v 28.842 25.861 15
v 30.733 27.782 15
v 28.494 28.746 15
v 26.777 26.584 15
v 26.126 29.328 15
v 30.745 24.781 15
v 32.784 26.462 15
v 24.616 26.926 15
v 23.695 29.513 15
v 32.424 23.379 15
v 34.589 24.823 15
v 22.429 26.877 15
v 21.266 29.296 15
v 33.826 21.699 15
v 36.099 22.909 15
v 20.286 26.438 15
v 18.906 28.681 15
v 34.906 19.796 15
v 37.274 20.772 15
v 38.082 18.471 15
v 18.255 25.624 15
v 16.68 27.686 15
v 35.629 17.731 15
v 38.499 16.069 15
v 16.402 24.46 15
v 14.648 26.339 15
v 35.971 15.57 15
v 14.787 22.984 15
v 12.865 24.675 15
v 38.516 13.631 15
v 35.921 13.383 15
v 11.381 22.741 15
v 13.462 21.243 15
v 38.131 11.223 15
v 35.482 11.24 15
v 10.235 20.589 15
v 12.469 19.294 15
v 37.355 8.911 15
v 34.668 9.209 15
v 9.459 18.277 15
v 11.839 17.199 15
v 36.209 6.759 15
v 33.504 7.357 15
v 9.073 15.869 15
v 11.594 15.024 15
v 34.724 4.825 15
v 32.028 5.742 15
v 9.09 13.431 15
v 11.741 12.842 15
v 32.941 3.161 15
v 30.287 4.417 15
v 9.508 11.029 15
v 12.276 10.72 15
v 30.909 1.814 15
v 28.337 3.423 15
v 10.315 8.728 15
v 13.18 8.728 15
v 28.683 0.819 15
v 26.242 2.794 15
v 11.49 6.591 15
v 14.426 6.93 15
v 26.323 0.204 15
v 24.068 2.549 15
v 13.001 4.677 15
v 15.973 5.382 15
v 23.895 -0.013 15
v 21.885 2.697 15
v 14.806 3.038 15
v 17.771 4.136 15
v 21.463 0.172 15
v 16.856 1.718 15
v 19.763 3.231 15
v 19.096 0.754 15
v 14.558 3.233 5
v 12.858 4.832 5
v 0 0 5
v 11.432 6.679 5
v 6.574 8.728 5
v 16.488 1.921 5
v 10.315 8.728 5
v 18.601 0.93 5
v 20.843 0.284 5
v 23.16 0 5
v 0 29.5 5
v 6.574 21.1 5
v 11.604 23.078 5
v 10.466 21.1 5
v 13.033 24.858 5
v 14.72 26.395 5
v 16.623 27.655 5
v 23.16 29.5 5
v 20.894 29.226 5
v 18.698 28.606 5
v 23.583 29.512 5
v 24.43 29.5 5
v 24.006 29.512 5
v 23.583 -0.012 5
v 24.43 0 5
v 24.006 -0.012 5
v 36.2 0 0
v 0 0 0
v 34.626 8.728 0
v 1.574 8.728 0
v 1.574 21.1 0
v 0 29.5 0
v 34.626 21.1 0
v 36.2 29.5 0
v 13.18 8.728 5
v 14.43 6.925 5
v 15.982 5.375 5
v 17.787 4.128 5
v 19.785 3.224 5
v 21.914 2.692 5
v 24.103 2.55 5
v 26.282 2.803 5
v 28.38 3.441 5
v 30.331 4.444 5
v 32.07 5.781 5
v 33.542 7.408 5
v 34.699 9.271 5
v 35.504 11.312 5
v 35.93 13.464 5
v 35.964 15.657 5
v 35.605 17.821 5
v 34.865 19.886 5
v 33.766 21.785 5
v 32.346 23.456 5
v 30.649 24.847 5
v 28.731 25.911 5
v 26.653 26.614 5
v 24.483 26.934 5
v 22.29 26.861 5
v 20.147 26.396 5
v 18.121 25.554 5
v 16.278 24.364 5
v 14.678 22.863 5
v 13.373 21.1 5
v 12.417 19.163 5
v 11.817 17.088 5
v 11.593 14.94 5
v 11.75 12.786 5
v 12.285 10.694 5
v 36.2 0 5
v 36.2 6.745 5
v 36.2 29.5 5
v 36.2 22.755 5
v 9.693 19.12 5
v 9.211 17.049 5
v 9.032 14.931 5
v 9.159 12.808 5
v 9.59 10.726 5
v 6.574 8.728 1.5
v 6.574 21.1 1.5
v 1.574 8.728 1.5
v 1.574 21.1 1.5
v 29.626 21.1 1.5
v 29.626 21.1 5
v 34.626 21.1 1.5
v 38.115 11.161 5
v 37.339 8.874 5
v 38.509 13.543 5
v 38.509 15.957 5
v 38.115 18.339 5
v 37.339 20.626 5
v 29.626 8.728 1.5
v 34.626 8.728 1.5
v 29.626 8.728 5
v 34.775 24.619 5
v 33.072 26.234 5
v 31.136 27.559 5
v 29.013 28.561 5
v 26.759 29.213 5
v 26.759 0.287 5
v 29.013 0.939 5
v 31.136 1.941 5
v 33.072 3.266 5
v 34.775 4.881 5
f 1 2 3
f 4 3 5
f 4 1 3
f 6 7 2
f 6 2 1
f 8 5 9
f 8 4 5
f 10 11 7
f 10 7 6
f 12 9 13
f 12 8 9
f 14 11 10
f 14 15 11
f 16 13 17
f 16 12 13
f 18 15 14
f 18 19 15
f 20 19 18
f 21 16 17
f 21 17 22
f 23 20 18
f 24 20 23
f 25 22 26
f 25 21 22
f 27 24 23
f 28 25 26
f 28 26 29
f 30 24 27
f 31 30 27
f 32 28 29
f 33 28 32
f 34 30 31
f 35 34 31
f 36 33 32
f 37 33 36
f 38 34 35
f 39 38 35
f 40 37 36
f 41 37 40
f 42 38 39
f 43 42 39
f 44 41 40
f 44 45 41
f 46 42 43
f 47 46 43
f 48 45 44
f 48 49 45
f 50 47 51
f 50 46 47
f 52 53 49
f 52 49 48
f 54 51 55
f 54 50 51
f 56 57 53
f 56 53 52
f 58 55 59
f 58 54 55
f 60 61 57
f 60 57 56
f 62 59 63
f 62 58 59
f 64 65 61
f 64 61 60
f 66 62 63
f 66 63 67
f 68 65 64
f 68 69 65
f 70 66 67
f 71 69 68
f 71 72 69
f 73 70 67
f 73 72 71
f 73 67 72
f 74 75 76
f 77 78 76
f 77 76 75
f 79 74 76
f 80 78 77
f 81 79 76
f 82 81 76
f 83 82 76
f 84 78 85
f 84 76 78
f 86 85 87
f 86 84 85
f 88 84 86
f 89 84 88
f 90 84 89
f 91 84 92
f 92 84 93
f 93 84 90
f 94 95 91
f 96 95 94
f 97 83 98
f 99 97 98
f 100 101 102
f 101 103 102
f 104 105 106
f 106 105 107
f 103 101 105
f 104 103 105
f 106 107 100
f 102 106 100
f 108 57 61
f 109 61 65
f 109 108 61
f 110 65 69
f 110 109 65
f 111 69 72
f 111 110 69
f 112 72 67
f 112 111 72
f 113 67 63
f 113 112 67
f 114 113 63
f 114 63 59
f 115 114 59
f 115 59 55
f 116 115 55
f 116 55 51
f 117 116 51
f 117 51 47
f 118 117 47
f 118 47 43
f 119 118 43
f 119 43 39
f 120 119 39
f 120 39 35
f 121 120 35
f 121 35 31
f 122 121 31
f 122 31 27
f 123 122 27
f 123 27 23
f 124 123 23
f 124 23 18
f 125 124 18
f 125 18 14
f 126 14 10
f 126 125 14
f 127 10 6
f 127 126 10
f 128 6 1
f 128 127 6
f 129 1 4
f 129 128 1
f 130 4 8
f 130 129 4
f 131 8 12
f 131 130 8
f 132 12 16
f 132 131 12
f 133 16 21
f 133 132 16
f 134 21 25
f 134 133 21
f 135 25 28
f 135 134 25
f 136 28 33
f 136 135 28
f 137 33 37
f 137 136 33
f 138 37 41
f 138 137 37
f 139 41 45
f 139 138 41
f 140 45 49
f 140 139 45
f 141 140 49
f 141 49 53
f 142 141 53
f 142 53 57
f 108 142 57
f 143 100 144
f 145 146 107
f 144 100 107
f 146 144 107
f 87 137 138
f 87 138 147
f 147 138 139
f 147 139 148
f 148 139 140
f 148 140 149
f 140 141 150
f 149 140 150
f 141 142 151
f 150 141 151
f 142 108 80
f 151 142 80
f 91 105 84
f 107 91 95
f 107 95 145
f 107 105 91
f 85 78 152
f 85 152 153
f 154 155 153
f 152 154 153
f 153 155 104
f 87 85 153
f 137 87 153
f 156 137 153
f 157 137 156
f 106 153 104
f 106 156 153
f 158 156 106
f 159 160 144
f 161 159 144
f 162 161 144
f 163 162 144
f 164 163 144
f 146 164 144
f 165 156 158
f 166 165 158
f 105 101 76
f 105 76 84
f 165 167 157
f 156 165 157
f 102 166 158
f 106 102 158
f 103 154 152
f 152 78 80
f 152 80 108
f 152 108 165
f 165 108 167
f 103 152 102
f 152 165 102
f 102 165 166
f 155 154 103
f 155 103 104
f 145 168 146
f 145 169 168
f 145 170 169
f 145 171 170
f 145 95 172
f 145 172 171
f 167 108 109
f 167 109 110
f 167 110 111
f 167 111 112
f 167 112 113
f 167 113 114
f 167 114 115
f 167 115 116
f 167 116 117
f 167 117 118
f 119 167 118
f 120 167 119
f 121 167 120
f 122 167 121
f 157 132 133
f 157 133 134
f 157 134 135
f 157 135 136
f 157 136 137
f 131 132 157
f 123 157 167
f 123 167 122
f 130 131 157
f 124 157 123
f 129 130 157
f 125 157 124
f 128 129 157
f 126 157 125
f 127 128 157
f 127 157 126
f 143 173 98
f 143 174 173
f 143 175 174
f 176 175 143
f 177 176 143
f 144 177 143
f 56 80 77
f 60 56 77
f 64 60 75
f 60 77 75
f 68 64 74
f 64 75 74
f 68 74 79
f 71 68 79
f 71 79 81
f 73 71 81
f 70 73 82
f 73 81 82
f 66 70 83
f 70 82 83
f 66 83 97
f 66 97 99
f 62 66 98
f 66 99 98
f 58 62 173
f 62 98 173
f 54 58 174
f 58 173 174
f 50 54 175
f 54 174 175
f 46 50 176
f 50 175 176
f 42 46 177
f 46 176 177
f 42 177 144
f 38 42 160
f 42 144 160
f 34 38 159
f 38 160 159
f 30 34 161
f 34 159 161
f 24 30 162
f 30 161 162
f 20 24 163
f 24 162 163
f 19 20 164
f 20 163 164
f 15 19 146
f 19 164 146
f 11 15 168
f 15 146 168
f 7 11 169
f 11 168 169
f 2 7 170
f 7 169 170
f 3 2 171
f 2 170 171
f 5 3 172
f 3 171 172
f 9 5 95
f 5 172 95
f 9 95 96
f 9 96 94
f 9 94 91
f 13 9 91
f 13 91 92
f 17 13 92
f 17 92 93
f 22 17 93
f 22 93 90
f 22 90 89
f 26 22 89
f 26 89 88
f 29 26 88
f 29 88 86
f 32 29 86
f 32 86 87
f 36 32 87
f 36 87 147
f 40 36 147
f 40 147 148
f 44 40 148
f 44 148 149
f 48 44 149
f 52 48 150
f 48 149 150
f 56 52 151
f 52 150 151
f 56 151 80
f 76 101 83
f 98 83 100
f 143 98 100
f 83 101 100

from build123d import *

# Parameters (mm, degrees)
SKETCH1_W           = 36.2
SKETCH1_H           = 29.5
BOSS_EXTRUDE1_DEPTH = 5
SKETCH3_W           = 33.053
SKETCH3_H           = 12.372
CUT_EXTRUDE1_DEPTH  = 47.964774033
SKETCH4_W           = 5
SKETCH4_H           = 12.372
BOSS_EXTRUDE2_DEPTH = 3.5
SKETCH5_R           = 14.763665
SKETCH5_R_2         = 12.2036
BOSS_EXTRUDE3_DEPTH = 10


with BuildPart() as part:
    # Sketch1 → Boss-Extrude1 (new body)
    with BuildSketch(Plane.XY):
        with Locations((18.1, 14.75)):
            Rectangle(SKETCH1_W, SKETCH1_H)
    extrude(amount=BOSS_EXTRUDE1_DEPTH)

    # Sketch3 → Cut-Extrude1 (cut, through all)
    with BuildSketch(Plane.XY.offset(5)):
        with Locations((18.1, 14.914)):
            Rectangle(SKETCH3_W, SKETCH3_H)
    extrude(amount=-CUT_EXTRUDE1_DEPTH, mode=Mode.SUBTRACT)

    # Sketch4 → Boss-Extrude2 (add)
    with BuildSketch(Plane.XY.offset(5)):
        with Locations((4.0735, 14.914)):
            Rectangle(SKETCH4_W, SKETCH4_H)
        with Locations((32.1265, 14.914)):
            Rectangle(SKETCH4_W, SKETCH4_H)
    extrude(amount=-BOSS_EXTRUDE2_DEPTH)

    # Sketch5 → Boss-Extrude3 (add)
    with BuildSketch(Plane.XY.offset(5)):
        with Locations(Location((23.79465, 14.75, 0), (0, 0, 204.072563575))):
            Circle(SKETCH5_R)
        with Locations(Location((23.79465, 14.75, 0), (0, 0, 209.568314483))):
            Circle(SKETCH5_R_2, mode=Mode.SUBTRACT)
    extrude(amount=BOSS_EXTRUDE3_DEPTH)


solid = part.part
